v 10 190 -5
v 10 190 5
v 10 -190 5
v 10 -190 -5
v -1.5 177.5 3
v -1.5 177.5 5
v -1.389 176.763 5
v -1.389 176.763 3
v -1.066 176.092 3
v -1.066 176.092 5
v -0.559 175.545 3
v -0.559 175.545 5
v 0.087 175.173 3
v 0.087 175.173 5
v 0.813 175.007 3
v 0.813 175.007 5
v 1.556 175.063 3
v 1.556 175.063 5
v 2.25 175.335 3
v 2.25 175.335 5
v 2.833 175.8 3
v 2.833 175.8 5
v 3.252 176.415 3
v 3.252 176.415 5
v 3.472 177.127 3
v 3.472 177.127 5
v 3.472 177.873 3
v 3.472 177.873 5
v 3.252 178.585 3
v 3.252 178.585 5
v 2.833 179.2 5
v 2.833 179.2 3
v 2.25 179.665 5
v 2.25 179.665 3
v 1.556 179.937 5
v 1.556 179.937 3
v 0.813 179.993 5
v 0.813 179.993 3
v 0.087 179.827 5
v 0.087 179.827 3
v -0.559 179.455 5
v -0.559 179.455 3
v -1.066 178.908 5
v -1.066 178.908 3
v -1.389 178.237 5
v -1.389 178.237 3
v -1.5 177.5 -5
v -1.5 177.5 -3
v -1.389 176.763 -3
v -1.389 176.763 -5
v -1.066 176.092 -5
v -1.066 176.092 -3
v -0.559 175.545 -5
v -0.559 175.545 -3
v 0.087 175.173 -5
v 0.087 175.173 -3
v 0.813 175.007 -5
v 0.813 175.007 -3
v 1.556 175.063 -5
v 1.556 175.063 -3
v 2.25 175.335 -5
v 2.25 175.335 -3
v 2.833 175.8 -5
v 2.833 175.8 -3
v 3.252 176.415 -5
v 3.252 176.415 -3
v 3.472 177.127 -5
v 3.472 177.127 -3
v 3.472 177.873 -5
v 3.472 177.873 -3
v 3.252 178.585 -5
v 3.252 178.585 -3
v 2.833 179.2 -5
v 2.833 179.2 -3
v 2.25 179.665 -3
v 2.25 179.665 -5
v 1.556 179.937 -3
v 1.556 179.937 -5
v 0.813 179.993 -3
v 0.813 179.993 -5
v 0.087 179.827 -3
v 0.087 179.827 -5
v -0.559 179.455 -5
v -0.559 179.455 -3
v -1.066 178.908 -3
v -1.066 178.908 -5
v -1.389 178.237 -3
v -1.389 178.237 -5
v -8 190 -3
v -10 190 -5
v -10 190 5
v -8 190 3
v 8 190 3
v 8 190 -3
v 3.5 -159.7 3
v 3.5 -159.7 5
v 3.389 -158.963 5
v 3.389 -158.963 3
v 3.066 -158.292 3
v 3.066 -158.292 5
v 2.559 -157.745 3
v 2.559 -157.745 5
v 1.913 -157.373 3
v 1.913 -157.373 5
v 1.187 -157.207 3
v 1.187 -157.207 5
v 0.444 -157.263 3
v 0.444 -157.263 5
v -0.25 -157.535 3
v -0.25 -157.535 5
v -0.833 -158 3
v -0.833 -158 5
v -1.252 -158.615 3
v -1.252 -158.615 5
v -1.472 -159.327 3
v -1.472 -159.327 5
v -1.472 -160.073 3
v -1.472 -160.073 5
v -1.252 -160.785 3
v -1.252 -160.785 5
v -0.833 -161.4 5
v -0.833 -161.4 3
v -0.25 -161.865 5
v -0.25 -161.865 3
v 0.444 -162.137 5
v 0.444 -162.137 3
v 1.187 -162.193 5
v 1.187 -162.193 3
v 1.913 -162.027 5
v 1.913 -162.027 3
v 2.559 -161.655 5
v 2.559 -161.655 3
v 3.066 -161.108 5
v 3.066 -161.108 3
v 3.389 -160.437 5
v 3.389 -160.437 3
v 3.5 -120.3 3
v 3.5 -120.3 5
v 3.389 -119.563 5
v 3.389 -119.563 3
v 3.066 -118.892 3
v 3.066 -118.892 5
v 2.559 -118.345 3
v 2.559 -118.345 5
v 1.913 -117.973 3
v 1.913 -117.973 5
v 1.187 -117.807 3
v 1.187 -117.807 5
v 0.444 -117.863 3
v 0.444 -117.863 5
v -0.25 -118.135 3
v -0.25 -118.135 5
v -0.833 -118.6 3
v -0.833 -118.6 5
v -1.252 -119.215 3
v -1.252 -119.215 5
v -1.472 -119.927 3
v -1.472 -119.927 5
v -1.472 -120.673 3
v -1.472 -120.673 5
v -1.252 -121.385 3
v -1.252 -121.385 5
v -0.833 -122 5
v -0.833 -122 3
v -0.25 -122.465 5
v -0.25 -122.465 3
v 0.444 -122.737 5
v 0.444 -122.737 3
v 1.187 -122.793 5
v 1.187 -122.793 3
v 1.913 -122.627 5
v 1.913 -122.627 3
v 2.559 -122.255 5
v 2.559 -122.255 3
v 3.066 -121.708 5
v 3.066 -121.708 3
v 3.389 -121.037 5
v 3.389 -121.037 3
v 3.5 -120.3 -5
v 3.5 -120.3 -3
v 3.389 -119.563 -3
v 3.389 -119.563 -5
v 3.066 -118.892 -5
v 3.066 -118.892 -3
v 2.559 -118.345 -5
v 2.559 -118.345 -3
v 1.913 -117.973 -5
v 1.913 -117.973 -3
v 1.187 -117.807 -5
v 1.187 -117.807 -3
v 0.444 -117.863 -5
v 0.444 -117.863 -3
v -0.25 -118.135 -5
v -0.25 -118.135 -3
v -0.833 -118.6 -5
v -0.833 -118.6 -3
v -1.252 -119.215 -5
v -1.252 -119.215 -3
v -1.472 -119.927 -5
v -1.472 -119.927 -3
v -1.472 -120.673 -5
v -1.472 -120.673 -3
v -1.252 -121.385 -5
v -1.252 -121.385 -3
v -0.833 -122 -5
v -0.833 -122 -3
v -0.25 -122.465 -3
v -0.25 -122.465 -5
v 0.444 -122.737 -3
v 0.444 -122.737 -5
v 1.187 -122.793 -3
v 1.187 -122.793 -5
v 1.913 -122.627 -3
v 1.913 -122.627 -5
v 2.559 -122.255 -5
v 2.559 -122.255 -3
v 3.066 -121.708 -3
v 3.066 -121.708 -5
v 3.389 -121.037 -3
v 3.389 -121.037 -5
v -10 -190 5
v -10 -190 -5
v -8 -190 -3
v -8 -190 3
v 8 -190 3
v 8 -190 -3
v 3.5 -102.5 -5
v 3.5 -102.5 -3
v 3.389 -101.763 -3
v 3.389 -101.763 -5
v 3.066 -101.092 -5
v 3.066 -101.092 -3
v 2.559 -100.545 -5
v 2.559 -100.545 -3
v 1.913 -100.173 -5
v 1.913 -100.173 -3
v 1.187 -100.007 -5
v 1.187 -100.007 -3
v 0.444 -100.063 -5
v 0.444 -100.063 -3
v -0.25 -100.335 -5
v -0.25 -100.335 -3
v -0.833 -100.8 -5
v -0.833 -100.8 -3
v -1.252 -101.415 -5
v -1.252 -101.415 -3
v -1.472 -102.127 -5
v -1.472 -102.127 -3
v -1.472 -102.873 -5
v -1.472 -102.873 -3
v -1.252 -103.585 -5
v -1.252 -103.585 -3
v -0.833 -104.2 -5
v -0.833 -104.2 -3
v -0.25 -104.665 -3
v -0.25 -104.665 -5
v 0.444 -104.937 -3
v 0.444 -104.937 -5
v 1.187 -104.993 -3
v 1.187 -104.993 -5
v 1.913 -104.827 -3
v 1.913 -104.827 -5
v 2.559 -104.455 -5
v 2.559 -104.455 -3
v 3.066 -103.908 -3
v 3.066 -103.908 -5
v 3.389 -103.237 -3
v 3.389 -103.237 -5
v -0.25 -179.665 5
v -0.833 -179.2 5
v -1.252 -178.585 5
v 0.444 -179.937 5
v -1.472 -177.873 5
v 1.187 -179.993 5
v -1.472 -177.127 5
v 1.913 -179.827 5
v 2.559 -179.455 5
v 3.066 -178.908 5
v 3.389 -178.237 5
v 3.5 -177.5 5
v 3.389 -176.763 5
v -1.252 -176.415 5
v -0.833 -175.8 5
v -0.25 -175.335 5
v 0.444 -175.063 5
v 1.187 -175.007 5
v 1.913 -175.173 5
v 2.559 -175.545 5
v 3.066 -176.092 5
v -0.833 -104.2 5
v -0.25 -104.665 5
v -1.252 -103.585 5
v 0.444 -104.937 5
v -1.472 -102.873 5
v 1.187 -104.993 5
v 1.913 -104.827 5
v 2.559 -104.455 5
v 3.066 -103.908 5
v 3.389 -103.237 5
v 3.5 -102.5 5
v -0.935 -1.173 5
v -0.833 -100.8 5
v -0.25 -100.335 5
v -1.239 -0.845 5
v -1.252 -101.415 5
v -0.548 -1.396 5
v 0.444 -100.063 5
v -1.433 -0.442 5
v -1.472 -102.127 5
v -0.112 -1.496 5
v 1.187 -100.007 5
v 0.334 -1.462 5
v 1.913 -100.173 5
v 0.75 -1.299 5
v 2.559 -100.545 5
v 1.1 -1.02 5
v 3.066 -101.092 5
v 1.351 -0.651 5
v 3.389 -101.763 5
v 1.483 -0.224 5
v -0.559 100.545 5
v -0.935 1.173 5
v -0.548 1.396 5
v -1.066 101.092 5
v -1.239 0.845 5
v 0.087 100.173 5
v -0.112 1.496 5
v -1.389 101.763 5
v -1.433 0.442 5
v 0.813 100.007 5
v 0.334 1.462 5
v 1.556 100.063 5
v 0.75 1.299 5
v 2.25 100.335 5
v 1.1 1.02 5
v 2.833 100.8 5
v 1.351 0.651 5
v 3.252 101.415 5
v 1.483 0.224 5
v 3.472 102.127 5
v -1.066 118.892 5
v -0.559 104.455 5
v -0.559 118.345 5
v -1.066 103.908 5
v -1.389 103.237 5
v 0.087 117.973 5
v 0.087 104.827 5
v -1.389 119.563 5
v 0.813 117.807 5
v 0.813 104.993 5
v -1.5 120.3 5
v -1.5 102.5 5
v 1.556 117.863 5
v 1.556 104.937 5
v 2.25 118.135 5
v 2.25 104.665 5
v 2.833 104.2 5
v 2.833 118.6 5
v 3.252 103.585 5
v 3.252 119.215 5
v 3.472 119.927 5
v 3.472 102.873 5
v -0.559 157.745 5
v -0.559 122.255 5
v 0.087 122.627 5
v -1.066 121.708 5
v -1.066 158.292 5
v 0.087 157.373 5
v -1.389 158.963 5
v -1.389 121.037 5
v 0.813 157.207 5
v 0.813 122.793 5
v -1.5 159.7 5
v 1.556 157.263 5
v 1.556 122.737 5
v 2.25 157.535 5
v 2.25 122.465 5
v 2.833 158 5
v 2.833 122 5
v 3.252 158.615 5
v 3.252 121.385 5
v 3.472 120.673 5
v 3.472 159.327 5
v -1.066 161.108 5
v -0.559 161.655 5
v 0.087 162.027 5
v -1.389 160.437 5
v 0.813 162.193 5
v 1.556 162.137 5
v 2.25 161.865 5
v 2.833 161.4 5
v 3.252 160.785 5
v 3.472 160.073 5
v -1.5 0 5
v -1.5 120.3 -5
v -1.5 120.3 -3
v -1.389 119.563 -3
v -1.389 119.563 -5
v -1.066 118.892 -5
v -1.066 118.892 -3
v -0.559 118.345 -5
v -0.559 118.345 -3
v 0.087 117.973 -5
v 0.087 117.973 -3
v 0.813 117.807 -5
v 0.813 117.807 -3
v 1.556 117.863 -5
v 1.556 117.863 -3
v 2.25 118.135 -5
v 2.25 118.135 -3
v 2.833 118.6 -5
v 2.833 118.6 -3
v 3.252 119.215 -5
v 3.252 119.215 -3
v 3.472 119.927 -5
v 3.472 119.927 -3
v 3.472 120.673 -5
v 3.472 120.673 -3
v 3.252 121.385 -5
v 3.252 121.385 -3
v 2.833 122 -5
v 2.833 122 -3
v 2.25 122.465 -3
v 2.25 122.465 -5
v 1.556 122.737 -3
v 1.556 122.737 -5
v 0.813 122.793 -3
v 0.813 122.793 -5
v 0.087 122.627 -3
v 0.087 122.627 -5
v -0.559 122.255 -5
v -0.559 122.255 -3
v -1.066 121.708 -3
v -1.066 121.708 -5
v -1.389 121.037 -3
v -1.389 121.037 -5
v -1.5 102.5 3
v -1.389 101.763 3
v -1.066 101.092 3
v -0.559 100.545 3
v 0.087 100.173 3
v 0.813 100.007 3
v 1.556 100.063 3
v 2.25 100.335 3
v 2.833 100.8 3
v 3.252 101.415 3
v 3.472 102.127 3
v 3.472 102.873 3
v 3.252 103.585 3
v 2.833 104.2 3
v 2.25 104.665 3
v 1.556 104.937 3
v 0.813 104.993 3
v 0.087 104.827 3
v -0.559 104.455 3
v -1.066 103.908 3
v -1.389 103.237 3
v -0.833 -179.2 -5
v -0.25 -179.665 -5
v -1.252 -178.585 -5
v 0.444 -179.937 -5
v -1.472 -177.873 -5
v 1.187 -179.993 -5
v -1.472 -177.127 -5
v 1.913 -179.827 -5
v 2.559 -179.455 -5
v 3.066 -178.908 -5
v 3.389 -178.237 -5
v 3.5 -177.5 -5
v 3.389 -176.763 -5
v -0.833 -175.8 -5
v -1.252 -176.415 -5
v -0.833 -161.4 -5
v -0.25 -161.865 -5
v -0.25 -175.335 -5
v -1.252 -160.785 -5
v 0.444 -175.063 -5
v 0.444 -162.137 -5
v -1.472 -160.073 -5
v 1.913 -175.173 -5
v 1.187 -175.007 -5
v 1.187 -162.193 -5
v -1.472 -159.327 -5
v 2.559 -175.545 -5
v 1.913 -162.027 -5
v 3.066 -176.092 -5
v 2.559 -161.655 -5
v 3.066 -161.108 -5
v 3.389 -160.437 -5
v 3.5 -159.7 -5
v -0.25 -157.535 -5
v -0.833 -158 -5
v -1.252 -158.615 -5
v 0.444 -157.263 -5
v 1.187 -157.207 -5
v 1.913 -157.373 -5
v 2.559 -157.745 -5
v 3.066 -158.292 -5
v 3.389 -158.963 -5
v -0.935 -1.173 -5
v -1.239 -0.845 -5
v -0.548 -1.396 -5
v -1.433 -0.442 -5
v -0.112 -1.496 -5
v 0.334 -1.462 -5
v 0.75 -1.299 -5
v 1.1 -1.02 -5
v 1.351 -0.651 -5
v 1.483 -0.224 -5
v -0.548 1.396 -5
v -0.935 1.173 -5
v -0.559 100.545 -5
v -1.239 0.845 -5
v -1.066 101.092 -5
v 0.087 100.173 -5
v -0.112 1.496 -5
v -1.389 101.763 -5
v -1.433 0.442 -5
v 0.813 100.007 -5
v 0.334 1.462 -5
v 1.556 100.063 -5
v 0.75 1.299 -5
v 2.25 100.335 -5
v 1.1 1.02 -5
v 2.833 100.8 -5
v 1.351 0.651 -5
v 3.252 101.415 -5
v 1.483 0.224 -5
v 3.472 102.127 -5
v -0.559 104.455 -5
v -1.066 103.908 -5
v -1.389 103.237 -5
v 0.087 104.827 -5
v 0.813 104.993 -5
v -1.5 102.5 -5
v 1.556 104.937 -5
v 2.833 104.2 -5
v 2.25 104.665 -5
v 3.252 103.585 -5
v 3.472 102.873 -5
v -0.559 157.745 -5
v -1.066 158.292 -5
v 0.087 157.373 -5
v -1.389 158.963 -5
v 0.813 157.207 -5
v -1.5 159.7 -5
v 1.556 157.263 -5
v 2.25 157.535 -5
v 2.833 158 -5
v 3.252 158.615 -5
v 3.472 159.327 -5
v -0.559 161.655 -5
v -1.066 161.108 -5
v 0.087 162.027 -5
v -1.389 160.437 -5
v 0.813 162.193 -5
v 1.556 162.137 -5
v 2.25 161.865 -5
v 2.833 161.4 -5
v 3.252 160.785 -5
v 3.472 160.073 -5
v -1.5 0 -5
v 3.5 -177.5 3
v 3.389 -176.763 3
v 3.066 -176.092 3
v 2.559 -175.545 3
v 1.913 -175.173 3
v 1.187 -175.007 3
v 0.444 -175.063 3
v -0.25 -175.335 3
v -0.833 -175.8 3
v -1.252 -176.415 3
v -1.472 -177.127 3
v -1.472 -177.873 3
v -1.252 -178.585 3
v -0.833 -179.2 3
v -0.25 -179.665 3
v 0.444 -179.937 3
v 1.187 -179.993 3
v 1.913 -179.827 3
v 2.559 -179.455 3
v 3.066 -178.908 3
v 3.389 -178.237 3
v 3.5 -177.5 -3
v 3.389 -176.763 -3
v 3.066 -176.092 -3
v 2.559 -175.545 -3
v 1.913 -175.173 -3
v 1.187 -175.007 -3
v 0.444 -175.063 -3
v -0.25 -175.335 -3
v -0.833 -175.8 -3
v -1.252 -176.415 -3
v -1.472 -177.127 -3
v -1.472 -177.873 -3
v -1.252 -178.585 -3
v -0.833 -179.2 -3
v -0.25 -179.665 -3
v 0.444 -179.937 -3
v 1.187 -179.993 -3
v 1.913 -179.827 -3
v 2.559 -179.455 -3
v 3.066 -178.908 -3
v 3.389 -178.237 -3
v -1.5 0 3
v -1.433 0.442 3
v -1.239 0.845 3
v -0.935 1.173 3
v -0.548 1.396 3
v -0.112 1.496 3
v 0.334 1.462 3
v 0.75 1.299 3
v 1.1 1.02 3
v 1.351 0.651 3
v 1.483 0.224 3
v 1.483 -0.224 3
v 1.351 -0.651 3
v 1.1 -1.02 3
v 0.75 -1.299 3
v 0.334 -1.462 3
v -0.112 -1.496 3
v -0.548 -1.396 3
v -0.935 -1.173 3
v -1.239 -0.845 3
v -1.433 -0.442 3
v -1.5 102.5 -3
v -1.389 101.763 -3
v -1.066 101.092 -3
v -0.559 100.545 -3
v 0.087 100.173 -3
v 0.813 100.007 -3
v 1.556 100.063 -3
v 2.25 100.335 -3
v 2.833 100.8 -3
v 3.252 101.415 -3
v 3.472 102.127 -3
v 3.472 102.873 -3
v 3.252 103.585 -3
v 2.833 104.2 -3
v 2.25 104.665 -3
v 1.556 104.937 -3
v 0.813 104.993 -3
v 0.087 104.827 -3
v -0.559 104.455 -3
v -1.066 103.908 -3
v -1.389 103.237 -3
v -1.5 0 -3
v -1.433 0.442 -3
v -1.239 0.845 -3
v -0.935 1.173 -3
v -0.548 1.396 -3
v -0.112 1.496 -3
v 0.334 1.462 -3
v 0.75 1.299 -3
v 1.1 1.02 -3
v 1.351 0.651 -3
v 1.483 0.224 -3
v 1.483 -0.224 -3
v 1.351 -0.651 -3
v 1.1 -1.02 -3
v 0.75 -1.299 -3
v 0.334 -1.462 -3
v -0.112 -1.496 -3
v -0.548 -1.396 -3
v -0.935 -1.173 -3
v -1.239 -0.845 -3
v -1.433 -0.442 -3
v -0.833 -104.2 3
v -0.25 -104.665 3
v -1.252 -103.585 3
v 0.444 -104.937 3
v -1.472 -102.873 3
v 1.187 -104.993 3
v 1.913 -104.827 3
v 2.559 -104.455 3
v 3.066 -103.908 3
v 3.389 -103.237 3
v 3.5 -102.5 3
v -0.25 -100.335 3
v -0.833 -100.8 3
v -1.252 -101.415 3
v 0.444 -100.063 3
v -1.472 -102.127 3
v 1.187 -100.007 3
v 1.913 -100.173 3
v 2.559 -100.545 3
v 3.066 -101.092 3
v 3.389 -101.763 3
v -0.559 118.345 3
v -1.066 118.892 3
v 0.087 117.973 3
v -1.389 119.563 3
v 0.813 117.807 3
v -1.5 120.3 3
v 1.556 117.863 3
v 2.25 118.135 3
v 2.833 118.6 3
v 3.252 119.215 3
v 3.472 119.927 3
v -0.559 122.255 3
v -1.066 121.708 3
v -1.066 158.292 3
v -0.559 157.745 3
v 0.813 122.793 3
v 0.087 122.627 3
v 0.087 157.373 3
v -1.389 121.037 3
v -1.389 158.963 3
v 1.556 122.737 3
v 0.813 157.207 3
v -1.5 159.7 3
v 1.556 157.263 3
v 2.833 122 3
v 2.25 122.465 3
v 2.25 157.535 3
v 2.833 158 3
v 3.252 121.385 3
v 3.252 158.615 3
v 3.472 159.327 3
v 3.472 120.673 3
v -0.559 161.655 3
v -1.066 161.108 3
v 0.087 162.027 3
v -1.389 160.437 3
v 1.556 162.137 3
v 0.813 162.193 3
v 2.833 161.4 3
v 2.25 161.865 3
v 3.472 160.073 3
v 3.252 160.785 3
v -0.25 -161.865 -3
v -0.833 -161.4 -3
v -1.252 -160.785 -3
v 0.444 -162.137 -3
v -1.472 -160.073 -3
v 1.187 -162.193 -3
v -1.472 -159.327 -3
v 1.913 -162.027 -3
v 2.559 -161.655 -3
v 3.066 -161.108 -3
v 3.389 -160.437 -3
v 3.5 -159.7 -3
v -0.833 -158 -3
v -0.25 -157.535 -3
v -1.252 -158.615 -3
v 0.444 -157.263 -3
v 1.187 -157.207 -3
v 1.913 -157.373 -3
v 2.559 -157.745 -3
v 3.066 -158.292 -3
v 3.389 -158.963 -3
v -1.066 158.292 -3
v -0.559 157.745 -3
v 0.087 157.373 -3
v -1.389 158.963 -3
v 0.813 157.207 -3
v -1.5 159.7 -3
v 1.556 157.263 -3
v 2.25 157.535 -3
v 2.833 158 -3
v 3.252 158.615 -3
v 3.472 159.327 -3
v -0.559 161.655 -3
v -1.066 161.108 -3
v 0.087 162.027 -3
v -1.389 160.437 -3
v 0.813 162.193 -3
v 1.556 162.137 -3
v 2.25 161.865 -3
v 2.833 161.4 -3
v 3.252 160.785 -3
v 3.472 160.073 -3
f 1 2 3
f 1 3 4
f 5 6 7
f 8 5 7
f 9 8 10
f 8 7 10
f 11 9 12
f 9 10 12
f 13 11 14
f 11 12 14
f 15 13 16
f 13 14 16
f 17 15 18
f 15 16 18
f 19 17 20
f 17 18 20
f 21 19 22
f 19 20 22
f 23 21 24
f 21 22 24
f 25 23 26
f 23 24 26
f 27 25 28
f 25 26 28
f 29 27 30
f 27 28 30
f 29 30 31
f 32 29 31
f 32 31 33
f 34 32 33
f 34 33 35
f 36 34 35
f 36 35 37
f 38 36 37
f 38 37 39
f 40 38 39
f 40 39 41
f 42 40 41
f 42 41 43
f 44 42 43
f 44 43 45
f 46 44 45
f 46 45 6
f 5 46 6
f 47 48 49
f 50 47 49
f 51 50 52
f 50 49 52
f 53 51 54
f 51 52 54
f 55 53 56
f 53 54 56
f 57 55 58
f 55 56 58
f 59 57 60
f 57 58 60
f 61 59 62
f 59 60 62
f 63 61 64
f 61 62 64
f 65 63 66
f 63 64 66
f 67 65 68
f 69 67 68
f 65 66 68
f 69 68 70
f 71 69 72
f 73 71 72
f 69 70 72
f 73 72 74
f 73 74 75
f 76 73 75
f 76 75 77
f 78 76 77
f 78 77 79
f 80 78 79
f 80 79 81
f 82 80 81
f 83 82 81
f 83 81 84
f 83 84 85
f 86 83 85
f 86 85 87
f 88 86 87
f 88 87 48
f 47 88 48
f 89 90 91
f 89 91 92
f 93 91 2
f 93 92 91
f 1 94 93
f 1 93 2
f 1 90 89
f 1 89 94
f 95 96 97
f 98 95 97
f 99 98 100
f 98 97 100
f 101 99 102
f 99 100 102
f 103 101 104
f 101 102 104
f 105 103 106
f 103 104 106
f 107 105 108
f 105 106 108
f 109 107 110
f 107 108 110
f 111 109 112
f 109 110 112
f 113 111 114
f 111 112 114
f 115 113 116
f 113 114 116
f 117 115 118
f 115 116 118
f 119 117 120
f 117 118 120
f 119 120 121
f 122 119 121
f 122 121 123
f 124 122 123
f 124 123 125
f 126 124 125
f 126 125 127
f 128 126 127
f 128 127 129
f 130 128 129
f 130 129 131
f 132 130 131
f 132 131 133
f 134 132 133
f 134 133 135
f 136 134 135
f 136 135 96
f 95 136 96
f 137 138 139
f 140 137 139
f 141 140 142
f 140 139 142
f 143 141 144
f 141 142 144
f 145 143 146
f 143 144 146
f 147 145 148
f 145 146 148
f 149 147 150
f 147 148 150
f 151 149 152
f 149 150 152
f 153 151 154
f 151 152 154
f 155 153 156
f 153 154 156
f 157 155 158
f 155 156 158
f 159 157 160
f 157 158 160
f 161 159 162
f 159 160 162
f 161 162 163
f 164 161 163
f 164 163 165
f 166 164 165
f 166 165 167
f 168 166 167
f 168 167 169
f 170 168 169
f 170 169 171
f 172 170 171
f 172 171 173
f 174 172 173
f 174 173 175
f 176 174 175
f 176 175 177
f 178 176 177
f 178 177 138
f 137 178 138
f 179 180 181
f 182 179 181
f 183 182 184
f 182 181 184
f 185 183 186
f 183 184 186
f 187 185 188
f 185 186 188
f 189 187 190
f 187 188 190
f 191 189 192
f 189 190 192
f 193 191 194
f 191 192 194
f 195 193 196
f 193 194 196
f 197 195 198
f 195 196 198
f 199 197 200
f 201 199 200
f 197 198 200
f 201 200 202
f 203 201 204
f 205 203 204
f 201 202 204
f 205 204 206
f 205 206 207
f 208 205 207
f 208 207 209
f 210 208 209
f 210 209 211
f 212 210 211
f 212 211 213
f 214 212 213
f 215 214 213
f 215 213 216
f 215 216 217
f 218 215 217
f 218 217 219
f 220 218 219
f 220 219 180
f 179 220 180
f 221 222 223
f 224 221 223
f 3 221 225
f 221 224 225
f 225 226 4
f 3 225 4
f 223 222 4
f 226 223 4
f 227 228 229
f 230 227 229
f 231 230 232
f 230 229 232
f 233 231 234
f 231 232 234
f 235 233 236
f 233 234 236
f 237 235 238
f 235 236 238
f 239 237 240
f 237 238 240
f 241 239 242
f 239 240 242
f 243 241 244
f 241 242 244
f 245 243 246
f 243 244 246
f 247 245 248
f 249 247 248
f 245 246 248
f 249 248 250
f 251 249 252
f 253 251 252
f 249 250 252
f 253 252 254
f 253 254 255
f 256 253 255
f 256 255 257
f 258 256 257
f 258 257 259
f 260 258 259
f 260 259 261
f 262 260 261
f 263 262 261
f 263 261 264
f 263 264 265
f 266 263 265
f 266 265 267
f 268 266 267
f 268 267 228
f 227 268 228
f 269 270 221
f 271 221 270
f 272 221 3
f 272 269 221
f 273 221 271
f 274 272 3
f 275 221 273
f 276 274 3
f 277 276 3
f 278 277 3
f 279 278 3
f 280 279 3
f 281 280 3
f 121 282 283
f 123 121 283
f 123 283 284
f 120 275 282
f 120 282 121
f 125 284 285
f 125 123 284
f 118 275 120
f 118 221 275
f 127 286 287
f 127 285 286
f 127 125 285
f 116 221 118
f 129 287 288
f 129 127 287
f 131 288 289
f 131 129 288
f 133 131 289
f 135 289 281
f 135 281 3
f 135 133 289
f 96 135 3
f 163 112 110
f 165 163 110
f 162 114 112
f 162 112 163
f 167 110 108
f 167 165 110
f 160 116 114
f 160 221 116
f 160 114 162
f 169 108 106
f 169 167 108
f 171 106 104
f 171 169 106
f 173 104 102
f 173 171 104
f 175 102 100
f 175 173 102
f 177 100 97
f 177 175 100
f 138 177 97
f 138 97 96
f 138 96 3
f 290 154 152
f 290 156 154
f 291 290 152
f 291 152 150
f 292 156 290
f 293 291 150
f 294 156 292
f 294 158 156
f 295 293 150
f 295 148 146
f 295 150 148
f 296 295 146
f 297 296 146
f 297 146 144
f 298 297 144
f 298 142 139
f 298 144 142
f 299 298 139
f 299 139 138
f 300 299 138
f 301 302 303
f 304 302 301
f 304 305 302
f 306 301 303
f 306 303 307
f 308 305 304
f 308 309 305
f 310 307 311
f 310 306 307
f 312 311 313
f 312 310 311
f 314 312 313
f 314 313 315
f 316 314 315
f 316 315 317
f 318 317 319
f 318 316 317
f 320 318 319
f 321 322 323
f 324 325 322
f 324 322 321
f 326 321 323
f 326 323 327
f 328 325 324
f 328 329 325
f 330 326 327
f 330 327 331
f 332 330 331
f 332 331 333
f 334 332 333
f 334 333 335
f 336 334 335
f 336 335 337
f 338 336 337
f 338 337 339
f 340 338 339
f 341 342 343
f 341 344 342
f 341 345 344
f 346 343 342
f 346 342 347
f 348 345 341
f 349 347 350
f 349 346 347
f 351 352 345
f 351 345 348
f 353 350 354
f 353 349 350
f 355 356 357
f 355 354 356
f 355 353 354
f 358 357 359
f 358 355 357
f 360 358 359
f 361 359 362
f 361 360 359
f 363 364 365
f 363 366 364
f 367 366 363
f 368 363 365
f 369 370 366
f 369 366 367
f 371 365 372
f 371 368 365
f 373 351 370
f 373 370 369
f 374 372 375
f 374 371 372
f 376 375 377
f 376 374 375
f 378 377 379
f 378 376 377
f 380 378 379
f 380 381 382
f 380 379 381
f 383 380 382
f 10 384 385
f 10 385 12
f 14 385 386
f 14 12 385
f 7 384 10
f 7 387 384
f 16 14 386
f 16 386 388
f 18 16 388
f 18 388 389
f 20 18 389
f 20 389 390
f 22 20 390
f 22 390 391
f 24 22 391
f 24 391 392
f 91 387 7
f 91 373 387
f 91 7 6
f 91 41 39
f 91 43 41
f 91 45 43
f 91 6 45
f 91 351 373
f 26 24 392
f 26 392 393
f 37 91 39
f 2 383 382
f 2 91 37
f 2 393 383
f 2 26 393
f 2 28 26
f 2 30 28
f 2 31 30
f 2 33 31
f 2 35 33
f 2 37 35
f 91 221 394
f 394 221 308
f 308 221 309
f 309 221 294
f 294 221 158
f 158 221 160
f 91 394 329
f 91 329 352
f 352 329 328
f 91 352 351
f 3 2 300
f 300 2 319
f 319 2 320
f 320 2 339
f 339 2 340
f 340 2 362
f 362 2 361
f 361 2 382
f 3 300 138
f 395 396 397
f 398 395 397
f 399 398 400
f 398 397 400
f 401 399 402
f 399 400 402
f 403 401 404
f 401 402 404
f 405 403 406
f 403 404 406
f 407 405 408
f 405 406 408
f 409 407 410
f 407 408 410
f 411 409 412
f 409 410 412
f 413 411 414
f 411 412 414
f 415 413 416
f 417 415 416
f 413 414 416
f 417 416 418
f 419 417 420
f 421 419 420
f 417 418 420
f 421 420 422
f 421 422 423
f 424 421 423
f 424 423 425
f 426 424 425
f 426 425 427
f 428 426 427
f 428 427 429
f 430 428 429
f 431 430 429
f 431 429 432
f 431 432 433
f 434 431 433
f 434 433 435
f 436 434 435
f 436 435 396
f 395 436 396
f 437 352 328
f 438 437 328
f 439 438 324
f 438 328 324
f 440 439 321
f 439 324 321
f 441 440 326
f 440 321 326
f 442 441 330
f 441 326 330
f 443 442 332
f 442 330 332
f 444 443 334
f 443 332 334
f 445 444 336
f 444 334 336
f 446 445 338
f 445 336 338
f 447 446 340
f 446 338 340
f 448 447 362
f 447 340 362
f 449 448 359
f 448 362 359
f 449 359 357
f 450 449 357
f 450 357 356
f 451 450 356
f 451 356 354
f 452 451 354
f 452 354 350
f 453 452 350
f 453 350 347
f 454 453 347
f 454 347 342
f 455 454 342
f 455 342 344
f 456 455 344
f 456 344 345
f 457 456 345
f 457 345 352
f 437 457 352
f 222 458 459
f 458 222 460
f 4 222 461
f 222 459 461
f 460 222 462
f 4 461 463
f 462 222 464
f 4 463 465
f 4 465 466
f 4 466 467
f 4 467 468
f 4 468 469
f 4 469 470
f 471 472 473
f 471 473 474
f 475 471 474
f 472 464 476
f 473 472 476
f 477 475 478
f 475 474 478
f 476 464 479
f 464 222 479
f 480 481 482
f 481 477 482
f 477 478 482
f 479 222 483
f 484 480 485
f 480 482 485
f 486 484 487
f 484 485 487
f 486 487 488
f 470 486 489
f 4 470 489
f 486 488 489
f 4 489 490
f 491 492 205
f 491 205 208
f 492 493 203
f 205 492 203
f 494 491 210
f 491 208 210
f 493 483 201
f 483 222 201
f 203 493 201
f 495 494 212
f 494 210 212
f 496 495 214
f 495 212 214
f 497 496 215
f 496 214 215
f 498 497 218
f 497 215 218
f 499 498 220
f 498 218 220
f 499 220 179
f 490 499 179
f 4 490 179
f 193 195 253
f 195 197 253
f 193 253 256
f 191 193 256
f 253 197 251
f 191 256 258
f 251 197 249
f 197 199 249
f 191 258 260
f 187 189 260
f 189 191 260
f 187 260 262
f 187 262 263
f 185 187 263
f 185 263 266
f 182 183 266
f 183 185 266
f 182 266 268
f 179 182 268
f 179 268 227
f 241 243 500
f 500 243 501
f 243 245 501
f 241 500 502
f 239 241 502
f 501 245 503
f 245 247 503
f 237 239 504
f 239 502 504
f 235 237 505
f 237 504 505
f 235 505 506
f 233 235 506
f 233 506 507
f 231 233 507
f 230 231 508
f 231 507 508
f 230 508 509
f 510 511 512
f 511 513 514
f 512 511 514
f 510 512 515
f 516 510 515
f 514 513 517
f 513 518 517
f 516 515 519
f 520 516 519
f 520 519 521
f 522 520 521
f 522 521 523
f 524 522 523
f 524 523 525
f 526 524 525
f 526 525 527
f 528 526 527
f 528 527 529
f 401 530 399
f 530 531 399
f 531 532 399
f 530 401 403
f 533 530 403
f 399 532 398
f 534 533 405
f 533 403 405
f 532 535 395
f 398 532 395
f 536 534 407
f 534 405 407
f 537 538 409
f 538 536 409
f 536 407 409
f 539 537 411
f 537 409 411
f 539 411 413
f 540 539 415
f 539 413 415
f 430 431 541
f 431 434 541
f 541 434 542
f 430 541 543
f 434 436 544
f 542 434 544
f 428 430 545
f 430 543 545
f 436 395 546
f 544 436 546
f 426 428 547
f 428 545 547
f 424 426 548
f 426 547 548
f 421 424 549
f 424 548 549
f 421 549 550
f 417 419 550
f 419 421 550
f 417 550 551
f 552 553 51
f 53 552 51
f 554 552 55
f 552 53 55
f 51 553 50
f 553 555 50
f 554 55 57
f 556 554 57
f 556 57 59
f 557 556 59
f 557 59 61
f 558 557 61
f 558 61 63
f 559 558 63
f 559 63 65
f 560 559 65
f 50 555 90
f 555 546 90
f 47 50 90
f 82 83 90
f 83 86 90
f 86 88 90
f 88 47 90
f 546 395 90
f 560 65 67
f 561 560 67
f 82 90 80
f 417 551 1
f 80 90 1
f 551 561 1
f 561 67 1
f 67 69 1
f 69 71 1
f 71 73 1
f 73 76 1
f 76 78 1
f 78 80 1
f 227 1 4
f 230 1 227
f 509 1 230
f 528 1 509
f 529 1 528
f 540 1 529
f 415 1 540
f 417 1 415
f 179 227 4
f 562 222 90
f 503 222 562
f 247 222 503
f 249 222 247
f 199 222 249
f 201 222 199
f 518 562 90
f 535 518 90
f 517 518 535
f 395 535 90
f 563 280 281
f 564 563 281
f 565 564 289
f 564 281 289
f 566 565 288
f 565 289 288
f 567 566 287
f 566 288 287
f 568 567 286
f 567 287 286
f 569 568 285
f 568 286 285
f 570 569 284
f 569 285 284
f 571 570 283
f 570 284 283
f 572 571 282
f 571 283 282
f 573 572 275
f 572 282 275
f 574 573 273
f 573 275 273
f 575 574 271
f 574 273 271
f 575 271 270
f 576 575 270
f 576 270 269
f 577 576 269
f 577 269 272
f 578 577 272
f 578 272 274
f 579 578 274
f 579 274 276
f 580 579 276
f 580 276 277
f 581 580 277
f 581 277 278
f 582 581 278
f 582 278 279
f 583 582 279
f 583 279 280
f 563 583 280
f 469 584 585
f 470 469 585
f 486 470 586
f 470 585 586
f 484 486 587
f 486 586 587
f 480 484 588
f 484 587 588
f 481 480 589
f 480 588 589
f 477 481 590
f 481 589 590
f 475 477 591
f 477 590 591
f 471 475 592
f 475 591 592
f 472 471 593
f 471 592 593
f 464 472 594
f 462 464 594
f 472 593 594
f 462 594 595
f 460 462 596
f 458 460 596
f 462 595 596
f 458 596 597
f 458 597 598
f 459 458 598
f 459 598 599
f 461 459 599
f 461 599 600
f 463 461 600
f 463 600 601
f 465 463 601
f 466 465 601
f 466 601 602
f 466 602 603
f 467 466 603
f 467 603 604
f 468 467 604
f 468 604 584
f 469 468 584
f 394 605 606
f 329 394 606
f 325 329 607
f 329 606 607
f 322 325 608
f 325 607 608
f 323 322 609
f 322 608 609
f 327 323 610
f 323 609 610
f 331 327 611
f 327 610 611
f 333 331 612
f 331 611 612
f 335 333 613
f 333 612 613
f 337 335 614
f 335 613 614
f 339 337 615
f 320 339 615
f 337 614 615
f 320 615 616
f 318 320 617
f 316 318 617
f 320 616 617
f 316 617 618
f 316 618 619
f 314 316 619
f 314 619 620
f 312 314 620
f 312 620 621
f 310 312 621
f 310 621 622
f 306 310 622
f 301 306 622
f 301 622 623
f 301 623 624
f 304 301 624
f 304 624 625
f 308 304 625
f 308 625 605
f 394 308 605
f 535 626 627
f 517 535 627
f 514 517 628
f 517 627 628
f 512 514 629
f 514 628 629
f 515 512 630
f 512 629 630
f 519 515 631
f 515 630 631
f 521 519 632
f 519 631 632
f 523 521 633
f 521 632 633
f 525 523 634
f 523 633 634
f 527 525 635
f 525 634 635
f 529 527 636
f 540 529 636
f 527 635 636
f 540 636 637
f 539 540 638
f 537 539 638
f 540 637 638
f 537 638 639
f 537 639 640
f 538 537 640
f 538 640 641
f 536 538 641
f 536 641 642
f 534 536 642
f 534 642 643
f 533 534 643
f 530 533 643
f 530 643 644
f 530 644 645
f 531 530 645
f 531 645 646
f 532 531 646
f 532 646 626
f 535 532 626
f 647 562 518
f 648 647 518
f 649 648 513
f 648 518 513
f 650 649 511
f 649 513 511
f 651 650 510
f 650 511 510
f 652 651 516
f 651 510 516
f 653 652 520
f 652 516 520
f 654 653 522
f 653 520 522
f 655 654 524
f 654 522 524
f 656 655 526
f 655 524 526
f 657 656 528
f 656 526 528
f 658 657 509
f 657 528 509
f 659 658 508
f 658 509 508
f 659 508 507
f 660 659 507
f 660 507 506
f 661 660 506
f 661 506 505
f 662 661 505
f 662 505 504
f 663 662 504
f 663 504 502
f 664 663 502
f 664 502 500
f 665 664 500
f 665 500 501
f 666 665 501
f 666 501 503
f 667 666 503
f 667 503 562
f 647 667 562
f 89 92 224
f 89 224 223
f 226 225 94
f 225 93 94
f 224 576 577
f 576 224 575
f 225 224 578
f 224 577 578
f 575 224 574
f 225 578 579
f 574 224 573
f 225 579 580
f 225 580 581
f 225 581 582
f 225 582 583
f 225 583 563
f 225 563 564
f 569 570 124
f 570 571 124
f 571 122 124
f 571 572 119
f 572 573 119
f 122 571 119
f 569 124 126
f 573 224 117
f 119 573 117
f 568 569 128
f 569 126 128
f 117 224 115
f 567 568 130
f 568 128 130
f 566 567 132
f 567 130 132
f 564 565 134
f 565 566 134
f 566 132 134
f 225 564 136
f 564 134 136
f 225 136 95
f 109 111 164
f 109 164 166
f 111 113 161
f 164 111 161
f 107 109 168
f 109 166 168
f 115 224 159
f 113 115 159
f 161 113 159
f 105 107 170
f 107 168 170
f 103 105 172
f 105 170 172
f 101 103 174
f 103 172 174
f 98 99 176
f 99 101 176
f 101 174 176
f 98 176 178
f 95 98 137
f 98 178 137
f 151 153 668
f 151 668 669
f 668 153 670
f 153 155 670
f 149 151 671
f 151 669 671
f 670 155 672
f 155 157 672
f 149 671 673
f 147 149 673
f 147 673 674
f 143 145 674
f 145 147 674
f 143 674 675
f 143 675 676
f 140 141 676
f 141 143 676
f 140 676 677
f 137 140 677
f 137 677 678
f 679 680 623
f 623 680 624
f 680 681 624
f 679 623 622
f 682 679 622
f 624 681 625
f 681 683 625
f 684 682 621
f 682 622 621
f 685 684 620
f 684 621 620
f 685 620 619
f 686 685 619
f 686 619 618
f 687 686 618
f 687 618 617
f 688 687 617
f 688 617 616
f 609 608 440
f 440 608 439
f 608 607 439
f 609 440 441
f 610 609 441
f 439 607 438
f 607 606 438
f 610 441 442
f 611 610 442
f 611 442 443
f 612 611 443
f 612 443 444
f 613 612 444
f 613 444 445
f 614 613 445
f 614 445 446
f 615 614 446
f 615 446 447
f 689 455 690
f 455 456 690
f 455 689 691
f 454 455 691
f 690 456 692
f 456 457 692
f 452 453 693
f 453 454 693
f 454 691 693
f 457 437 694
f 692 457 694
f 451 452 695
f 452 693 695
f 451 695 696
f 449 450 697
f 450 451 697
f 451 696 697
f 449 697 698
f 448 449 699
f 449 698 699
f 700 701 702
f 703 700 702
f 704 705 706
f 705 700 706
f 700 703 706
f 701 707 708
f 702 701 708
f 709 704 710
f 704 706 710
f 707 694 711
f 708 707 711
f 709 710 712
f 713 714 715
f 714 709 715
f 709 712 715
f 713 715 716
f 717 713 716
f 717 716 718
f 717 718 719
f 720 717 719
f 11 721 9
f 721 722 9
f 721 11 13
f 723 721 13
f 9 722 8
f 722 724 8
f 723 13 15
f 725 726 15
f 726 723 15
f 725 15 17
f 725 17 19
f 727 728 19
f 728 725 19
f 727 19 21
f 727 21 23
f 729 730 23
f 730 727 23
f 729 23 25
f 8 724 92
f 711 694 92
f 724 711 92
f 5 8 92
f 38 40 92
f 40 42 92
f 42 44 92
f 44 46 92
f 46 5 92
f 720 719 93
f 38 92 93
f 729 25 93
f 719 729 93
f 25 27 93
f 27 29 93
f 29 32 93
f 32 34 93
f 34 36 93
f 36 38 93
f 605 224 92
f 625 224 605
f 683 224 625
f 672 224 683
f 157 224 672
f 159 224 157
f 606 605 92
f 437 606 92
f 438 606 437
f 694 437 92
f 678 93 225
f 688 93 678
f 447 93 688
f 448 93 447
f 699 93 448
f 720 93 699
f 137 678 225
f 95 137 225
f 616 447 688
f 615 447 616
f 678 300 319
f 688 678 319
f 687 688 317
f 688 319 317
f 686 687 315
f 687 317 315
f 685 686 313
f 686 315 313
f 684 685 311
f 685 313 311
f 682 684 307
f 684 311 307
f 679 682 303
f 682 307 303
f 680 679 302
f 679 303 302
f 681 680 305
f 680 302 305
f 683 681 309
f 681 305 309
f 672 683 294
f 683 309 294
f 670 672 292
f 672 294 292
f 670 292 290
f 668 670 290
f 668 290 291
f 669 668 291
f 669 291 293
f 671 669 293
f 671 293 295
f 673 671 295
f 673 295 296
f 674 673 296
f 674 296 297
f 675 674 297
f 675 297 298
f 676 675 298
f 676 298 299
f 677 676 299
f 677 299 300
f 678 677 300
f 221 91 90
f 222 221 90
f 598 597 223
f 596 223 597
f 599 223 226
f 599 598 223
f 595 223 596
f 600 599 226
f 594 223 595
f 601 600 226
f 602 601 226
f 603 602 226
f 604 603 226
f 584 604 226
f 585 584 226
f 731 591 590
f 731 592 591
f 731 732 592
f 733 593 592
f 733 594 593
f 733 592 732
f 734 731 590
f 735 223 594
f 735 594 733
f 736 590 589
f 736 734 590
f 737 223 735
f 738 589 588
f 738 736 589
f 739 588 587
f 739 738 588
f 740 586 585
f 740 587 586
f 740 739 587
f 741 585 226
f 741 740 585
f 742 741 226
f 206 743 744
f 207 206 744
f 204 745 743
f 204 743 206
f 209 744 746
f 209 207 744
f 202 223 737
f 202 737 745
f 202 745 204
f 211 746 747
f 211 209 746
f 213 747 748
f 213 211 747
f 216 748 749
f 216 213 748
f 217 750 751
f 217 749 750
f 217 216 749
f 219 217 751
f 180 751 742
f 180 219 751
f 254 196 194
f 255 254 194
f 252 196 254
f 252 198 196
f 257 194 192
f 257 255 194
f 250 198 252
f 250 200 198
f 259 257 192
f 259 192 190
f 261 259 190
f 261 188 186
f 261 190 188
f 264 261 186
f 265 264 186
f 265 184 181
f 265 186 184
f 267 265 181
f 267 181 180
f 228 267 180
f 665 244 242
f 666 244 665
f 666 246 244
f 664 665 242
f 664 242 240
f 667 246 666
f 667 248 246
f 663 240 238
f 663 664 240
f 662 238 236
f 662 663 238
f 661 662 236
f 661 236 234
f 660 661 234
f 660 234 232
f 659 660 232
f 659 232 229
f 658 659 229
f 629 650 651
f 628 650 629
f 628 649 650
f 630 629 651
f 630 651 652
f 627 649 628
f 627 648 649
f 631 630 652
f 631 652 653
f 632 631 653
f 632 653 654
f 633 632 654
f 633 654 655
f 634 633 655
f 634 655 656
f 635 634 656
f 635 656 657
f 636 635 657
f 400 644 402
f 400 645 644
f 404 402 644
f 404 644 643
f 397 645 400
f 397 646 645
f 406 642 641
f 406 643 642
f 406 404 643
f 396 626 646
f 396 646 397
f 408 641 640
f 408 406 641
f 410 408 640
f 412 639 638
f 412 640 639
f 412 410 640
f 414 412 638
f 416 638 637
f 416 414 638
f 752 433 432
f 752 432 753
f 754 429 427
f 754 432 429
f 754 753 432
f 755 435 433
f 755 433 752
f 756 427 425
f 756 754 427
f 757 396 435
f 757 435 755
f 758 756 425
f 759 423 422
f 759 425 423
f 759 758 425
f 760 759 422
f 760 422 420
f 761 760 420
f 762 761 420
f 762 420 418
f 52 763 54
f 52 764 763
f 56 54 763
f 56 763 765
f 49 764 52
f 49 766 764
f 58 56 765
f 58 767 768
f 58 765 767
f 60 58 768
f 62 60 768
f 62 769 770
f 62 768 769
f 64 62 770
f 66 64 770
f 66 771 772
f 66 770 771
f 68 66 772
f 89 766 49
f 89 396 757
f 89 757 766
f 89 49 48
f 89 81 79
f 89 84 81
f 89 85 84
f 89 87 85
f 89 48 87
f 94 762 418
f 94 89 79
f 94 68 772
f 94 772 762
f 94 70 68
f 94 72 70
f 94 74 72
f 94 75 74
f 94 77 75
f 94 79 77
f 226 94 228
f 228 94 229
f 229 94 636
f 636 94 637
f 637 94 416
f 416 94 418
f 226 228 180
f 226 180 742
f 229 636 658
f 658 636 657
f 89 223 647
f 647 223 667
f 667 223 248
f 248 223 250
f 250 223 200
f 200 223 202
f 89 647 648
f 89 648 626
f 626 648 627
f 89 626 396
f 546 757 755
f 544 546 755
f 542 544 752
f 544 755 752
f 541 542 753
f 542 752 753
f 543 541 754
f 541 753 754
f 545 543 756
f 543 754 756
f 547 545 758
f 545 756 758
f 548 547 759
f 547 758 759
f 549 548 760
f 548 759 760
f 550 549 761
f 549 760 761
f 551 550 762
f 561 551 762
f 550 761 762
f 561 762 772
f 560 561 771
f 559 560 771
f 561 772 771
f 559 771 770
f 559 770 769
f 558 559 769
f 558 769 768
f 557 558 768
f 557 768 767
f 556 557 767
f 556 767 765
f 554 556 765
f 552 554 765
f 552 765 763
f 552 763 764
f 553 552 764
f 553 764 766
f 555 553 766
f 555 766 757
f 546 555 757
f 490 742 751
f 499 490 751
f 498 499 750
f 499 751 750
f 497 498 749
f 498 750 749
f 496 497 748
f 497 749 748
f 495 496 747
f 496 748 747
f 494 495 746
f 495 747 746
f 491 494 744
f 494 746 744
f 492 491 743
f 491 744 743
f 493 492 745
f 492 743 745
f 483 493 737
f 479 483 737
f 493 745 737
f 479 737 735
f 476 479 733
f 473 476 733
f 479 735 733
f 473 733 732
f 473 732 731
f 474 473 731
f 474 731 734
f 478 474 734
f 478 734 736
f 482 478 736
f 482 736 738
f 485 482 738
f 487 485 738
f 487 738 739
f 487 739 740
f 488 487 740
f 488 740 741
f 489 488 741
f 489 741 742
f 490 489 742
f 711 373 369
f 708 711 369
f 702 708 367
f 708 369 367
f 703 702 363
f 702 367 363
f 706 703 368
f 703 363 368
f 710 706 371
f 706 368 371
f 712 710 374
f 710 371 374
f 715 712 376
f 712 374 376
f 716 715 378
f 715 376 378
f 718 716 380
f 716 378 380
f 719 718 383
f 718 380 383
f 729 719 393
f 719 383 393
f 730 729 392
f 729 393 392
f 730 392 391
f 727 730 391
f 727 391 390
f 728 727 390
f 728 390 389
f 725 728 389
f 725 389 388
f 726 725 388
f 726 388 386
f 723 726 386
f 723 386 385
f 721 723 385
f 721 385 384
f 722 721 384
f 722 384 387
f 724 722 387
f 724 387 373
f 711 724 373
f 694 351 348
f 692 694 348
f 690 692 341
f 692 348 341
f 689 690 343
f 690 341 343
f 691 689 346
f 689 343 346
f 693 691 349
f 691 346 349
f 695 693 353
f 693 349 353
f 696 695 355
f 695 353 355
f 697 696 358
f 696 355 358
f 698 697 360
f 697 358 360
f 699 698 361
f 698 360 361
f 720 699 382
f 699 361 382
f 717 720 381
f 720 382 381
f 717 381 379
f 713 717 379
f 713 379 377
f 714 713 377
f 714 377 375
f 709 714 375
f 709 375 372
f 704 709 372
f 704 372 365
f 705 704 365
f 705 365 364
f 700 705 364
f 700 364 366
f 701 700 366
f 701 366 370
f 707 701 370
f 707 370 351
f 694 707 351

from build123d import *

# Parameters (mm, degrees)
SKETCH_1_W          = 20
SKETCH_1_H          = 10
SKETCH_1_W_2        = 16
SKETCH_1_H_2        = 6
EXTRUDE_1_DEPTH     = 190
SKETCH_2_R          = 2.5
CUT_EXTRUDE_1_DEPTH = 191.525588833
SKETCH_3_R          = 1.5
CUT_EXTRUDE_2_DEPTH = 191.525588833


with BuildPart() as part:
    # 草图1 → 凸台-拉伸1 (new, symmetric)
    with BuildSketch(Plane(origin=(0, 0, 0), x_dir=(1, 0, 0), z_dir=(0, 1, 0))):
        Rectangle(SKETCH_1_W, SKETCH_1_H)
        Rectangle(SKETCH_1_W_2, SKETCH_1_H_2, mode=Mode.SUBTRACT)
    extrude(amount=EXTRUDE_1_DEPTH, both=True)

    # 草图2 → 切除-拉伸1 (cut, through all)
    with BuildSketch(Plane.XY.offset(5)):
        with Locations((1, -177.5)):
            Circle(SKETCH_2_R)
        with Locations((1, -159.7)):
            Circle(SKETCH_2_R)
        with Locations((1, -120.3)):
            Circle(SKETCH_2_R)
        with Locations((1, -102.5)):
            Circle(SKETCH_2_R)
        with Locations(Location((1, 102.5, 0), (0, 0, 180))):
            Circle(SKETCH_2_R)
        with Locations(Location((1, 120.3, 0), (0, 0, 180))):
            Circle(SKETCH_2_R)
        with Locations(Location((1, 159.7, 0), (0, 0, 180))):
            Circle(SKETCH_2_R)
        with Locations(Location((1, 177.5, 0), (0, 0, 180))):
            Circle(SKETCH_2_R)
    extrude(amount=-CUT_EXTRUDE_1_DEPTH, mode=Mode.SUBTRACT)

    # 草图3 → 切除-拉伸2 (cut, through all)
    with BuildSketch(Plane(origin=(0, 0, -5), x_dir=(-1, 0, 0), z_dir=(0, 0, -1))):
        Circle(SKETCH_3_R)
    extrude(amount=-CUT_EXTRUDE_2_DEPTH, mode=Mode.SUBTRACT)


solid = part.part
